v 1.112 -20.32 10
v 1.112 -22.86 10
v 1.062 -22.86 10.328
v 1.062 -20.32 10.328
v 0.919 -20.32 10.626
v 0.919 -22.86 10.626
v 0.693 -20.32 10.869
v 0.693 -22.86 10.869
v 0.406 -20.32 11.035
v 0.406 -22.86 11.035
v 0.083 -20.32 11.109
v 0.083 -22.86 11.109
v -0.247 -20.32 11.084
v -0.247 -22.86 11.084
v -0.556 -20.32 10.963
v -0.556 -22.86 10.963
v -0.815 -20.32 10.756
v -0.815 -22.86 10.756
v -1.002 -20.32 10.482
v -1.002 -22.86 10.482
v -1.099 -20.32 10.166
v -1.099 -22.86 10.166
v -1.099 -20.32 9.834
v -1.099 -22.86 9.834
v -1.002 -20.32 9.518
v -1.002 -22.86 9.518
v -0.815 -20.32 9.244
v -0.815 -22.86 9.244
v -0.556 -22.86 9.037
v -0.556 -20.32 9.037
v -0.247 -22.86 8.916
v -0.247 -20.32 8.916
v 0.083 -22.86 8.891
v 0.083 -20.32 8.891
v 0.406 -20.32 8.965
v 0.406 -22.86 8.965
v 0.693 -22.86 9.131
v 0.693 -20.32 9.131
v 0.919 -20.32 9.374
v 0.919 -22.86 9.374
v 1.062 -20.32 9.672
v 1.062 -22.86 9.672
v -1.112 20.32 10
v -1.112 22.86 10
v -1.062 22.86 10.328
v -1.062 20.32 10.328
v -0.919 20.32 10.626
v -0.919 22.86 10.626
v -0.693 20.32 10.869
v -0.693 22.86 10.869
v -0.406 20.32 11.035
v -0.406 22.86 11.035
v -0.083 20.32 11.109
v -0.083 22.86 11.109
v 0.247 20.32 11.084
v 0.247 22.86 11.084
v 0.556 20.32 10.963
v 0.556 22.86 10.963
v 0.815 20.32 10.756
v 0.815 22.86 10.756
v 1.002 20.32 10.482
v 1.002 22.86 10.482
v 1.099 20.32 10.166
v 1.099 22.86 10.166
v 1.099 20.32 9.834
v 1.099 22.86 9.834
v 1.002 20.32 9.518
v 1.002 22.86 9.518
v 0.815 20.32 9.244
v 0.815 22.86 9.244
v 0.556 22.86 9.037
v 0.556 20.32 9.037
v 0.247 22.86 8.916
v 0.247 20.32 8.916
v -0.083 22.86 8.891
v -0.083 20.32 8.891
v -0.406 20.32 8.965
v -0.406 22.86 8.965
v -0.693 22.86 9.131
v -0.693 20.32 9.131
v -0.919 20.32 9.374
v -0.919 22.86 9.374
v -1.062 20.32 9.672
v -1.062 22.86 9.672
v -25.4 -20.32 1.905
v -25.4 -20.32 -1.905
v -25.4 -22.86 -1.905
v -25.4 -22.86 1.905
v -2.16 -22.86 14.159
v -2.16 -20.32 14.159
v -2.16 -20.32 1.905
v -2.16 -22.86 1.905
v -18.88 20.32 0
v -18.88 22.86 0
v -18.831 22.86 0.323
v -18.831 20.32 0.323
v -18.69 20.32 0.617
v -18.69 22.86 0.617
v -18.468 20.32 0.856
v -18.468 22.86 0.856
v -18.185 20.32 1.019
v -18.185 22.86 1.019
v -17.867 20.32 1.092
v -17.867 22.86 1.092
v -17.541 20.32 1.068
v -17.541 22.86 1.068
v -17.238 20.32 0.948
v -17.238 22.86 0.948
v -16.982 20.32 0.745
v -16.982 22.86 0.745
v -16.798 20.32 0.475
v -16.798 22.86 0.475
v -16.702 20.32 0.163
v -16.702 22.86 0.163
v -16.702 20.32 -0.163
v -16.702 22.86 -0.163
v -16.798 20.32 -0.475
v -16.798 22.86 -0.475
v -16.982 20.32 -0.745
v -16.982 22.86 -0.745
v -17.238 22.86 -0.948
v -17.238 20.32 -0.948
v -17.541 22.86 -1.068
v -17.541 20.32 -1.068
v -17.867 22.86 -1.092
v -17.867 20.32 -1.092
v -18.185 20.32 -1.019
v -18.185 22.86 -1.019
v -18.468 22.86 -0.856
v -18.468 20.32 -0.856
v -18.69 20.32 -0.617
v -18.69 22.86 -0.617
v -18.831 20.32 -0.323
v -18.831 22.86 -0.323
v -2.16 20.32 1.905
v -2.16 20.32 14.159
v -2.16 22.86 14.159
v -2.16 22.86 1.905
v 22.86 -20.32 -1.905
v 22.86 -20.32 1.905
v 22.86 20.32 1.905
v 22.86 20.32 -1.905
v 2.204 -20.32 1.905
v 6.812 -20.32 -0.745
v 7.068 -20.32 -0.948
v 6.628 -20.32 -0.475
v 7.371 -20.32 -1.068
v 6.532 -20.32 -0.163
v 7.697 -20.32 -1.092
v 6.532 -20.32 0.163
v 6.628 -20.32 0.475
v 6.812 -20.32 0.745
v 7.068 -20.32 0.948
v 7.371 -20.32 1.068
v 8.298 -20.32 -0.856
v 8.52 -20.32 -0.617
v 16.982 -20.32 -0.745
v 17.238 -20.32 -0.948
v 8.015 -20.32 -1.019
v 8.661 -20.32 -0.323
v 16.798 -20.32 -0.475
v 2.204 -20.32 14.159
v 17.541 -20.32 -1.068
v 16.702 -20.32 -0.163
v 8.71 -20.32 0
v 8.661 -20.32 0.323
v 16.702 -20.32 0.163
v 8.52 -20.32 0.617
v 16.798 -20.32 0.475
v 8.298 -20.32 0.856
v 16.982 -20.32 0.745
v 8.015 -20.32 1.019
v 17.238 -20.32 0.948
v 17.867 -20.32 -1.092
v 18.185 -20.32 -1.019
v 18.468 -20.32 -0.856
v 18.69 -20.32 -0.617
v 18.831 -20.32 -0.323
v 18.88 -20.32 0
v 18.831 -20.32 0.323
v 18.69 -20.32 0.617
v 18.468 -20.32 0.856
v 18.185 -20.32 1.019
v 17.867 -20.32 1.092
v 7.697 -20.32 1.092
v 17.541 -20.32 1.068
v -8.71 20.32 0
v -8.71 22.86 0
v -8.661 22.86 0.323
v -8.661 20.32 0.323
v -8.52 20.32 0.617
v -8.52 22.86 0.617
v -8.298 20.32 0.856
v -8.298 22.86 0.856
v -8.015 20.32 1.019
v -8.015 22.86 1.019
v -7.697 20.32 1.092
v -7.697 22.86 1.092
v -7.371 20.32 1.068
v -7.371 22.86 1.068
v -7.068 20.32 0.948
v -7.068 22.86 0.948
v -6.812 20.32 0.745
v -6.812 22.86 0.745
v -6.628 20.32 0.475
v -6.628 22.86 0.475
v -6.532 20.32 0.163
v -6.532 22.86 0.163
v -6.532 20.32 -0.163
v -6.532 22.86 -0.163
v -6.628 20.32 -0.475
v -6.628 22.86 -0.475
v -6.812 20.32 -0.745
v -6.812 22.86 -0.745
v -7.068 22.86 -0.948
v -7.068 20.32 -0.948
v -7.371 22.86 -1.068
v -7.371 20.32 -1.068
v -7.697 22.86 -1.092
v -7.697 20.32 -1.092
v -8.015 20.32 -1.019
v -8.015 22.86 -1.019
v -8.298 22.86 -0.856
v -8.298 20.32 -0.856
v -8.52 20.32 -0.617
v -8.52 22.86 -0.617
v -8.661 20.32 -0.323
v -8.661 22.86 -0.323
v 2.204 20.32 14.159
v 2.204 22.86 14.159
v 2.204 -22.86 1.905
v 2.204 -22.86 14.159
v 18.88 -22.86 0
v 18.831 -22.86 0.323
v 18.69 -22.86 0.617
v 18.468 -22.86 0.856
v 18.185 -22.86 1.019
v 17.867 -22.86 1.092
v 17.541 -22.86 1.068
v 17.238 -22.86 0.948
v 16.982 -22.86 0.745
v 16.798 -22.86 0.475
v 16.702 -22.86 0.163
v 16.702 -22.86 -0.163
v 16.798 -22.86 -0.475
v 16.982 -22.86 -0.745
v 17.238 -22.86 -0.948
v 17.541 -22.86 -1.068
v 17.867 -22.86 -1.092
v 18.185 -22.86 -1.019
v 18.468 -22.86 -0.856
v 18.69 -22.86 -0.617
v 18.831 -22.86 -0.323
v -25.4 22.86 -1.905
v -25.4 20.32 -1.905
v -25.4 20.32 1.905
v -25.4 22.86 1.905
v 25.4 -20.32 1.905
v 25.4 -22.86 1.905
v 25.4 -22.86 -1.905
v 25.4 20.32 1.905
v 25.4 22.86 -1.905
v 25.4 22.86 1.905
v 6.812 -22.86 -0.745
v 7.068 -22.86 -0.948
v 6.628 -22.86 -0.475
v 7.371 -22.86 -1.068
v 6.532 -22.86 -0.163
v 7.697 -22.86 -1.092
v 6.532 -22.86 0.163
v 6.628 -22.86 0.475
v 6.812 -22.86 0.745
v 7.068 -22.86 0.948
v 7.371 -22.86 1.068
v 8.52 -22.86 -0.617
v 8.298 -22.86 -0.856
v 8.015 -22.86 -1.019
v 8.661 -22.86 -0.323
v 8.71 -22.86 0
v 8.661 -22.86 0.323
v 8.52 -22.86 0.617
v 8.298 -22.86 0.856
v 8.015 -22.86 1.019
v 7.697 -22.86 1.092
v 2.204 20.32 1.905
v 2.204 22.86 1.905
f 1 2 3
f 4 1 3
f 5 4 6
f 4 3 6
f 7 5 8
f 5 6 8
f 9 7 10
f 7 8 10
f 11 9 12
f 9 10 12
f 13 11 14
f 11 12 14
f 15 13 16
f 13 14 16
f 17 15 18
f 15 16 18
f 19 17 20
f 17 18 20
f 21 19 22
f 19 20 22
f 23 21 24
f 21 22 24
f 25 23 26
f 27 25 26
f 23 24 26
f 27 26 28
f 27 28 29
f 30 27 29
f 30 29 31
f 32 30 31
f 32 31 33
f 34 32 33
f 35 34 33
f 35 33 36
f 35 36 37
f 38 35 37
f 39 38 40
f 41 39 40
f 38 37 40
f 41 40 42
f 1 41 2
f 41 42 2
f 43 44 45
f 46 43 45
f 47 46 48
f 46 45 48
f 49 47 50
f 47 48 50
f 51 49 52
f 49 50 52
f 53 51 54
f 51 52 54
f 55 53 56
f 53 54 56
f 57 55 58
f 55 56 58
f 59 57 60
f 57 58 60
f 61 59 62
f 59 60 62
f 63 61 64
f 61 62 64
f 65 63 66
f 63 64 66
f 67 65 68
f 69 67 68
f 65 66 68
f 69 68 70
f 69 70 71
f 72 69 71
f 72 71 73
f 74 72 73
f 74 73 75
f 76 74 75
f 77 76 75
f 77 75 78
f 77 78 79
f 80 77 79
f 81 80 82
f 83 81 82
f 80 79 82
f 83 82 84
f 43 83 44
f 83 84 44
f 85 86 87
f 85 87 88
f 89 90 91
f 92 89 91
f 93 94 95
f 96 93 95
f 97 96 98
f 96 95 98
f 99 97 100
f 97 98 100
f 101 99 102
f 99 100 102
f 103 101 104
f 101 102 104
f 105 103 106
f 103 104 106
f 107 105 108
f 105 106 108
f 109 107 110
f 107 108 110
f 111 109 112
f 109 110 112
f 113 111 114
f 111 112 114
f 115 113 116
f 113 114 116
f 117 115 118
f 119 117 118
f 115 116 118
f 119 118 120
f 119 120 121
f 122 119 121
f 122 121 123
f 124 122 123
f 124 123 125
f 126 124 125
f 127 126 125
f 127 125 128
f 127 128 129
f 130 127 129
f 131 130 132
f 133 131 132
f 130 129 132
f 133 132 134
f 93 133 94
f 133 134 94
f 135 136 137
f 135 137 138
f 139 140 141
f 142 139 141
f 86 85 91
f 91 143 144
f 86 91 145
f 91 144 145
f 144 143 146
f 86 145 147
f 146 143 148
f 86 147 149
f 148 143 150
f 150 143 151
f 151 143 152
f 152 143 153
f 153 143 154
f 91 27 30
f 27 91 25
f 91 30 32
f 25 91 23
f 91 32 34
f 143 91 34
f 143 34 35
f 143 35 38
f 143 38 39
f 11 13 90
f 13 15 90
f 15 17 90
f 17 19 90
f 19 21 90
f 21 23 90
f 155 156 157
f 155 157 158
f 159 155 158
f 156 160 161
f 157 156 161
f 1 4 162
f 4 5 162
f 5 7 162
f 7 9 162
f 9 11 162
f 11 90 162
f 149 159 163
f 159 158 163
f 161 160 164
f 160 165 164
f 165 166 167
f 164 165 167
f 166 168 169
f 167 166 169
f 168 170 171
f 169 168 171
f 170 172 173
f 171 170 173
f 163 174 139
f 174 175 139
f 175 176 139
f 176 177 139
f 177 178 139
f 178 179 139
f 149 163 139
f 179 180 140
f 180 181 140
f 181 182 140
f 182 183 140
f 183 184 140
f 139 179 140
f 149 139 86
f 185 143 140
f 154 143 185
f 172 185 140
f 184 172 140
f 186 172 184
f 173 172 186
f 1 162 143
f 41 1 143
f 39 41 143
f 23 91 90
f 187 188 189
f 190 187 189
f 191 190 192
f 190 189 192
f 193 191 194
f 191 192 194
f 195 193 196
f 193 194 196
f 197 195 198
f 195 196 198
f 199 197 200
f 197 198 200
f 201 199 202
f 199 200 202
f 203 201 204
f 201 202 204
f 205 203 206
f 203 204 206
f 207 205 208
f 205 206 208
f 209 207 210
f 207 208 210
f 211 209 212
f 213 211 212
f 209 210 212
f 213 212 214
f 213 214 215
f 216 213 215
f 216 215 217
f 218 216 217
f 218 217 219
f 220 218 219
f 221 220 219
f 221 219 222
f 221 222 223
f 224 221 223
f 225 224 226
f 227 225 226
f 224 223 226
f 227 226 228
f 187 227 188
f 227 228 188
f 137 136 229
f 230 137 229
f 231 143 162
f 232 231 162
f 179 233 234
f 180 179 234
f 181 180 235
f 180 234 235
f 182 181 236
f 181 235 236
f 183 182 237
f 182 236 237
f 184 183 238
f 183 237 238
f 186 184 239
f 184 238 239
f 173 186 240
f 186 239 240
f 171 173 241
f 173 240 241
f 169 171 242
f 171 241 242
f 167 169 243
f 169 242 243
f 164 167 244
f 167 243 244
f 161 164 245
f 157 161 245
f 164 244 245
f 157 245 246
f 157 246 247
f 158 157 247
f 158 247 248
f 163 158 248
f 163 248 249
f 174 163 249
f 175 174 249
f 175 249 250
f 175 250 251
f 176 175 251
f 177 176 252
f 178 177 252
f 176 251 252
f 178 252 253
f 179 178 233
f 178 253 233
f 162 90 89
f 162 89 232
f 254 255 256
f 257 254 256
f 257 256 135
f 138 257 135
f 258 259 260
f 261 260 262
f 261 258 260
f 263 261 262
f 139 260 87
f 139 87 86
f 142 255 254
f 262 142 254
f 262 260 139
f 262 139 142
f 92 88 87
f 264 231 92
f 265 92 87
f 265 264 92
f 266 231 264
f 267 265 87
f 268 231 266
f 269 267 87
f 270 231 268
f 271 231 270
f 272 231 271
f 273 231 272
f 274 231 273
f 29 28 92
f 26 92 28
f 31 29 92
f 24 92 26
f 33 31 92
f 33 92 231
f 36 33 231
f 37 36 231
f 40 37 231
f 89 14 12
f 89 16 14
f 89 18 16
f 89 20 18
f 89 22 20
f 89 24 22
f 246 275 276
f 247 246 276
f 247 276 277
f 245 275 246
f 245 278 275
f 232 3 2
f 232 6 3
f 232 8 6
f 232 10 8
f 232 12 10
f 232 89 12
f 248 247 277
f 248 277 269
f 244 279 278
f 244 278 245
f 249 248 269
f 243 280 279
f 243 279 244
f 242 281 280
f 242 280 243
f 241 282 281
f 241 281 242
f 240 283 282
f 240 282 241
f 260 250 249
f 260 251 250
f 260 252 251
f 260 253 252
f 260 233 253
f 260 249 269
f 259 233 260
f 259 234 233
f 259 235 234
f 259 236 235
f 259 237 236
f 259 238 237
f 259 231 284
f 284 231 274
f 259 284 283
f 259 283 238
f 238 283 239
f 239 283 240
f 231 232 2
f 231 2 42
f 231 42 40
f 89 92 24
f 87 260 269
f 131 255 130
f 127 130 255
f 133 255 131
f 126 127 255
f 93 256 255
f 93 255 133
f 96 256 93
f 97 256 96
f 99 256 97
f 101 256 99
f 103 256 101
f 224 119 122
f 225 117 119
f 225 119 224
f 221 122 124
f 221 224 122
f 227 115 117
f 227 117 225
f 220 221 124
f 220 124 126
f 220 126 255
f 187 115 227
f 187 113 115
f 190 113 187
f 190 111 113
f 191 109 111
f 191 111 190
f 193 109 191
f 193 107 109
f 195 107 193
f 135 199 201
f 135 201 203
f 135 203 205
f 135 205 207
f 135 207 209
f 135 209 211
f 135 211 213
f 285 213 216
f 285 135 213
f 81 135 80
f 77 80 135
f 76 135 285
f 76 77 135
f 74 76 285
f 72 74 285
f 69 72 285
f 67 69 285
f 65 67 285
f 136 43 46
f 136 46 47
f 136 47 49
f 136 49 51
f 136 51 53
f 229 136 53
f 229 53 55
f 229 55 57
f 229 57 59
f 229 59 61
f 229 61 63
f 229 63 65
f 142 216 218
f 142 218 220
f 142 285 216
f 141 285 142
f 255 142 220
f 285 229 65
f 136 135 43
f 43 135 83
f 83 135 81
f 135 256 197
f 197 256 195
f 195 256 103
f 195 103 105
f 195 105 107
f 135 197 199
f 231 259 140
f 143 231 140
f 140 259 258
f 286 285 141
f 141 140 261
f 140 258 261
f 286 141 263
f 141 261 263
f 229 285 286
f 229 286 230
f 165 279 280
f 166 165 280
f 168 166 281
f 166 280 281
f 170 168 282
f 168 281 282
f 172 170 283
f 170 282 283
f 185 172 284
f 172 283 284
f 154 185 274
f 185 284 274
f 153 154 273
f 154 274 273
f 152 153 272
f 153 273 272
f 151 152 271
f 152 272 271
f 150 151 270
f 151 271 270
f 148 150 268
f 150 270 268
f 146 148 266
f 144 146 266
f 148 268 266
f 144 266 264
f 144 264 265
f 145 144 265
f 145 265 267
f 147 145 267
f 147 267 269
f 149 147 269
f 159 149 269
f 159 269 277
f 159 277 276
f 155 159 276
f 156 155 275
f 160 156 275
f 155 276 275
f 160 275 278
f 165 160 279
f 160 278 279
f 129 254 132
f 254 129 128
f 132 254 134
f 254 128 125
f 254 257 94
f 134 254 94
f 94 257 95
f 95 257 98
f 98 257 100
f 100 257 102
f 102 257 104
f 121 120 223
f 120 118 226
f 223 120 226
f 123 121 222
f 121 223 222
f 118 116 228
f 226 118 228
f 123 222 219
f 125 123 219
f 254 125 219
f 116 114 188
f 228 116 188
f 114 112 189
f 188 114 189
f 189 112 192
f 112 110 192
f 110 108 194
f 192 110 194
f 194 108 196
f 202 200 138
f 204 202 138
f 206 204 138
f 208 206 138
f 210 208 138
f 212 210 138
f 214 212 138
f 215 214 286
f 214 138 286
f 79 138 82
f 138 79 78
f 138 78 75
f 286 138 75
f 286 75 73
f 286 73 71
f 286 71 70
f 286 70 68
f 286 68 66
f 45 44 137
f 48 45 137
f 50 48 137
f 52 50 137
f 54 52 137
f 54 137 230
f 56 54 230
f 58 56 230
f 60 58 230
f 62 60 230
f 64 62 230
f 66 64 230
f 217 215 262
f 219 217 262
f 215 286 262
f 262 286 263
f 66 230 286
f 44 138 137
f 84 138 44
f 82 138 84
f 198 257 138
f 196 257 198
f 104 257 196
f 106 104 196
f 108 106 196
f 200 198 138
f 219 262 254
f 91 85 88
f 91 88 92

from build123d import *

# Parameters (mm, degrees)
F0_W     = 23.1957846131
F0_H     = 3.81
F0_W_2   = 4.3642977253
F0_H_2   = 12.2541113061
F0_W_3   = 23.2399176616
F1_DEPTH = 2.54
F3_R     = 1.095
F3_R_2   = 1.1118429646
F5_DEPTH = 2.54
F6_W     = 40.64
F6_H     = 3.81
F7_DEPTH = 2.54
F8_R     = 1.095
F8_R_2   = 1.1118429646
F9_DEPTH = 2.54


with BuildPart() as f1:
    # F0 (on Front) → F1 (new body)
    with BuildSketch(Plane.XZ):
        with Locations((13.8021076934, 0)):
            Rectangle(F0_W, F0_H)
        with Locations((0.0220665243, 0)):
            Rectangle(F0_W_2, F0_H)
        with Locations((0.0220665243, 8.032055653)):
            Rectangle(F0_W_2, F0_H_2)
        with Locations((-13.7800411692, 0)):
            Rectangle(F0_W_3, F0_H)
    extrude(amount=F1_DEPTH)


with BuildPart() as f1_1:
    # F2: moved
    add(f1.part.moved(Location((0, -20.32, 0))))


with BuildPart() as f4_1:
    # F4: instance of F1
    add(f1_1.part.mirror(Plane.XZ))


with BuildPart() as f1_2:
    add(f1_1.part)

    # F3 (on face) → F5 (cut, through all)
    with BuildSketch(Plane.XZ.offset(22.86)):
        with Locations((7.615, 0)):
            Circle(F3_R)
        with Locations((17.785, 0)):
            Circle(F3_R)
        with Locations((0, 10)):
            Circle(F3_R_2)
    extrude(amount=-F5_DEPTH, mode=Mode.SUBTRACT)

    add(f4_1.part)  # F7 merges F4_1
    # F6 (on face) → F7 (join)
    with BuildSketch(Plane.YZ.offset(25.4)):
        Rectangle(F6_W, F6_H)
    extrude(amount=-F7_DEPTH)

    # F8 (on face) → F9 (cut, through all)
    with BuildSketch(Plane(origin=(0, 22.86, 0), x_dir=(-1, 0, 0), z_dir=(0, 1, 0))):
        with Locations((7.615, 0)):
            Circle(F8_R)
        with Locations((17.785, 0)):
            Circle(F8_R)
        with Locations((0, 10)):
            Circle(F8_R_2)
    extrude(amount=-F9_DEPTH, mode=Mode.SUBTRACT)


solid = f1_2.part
